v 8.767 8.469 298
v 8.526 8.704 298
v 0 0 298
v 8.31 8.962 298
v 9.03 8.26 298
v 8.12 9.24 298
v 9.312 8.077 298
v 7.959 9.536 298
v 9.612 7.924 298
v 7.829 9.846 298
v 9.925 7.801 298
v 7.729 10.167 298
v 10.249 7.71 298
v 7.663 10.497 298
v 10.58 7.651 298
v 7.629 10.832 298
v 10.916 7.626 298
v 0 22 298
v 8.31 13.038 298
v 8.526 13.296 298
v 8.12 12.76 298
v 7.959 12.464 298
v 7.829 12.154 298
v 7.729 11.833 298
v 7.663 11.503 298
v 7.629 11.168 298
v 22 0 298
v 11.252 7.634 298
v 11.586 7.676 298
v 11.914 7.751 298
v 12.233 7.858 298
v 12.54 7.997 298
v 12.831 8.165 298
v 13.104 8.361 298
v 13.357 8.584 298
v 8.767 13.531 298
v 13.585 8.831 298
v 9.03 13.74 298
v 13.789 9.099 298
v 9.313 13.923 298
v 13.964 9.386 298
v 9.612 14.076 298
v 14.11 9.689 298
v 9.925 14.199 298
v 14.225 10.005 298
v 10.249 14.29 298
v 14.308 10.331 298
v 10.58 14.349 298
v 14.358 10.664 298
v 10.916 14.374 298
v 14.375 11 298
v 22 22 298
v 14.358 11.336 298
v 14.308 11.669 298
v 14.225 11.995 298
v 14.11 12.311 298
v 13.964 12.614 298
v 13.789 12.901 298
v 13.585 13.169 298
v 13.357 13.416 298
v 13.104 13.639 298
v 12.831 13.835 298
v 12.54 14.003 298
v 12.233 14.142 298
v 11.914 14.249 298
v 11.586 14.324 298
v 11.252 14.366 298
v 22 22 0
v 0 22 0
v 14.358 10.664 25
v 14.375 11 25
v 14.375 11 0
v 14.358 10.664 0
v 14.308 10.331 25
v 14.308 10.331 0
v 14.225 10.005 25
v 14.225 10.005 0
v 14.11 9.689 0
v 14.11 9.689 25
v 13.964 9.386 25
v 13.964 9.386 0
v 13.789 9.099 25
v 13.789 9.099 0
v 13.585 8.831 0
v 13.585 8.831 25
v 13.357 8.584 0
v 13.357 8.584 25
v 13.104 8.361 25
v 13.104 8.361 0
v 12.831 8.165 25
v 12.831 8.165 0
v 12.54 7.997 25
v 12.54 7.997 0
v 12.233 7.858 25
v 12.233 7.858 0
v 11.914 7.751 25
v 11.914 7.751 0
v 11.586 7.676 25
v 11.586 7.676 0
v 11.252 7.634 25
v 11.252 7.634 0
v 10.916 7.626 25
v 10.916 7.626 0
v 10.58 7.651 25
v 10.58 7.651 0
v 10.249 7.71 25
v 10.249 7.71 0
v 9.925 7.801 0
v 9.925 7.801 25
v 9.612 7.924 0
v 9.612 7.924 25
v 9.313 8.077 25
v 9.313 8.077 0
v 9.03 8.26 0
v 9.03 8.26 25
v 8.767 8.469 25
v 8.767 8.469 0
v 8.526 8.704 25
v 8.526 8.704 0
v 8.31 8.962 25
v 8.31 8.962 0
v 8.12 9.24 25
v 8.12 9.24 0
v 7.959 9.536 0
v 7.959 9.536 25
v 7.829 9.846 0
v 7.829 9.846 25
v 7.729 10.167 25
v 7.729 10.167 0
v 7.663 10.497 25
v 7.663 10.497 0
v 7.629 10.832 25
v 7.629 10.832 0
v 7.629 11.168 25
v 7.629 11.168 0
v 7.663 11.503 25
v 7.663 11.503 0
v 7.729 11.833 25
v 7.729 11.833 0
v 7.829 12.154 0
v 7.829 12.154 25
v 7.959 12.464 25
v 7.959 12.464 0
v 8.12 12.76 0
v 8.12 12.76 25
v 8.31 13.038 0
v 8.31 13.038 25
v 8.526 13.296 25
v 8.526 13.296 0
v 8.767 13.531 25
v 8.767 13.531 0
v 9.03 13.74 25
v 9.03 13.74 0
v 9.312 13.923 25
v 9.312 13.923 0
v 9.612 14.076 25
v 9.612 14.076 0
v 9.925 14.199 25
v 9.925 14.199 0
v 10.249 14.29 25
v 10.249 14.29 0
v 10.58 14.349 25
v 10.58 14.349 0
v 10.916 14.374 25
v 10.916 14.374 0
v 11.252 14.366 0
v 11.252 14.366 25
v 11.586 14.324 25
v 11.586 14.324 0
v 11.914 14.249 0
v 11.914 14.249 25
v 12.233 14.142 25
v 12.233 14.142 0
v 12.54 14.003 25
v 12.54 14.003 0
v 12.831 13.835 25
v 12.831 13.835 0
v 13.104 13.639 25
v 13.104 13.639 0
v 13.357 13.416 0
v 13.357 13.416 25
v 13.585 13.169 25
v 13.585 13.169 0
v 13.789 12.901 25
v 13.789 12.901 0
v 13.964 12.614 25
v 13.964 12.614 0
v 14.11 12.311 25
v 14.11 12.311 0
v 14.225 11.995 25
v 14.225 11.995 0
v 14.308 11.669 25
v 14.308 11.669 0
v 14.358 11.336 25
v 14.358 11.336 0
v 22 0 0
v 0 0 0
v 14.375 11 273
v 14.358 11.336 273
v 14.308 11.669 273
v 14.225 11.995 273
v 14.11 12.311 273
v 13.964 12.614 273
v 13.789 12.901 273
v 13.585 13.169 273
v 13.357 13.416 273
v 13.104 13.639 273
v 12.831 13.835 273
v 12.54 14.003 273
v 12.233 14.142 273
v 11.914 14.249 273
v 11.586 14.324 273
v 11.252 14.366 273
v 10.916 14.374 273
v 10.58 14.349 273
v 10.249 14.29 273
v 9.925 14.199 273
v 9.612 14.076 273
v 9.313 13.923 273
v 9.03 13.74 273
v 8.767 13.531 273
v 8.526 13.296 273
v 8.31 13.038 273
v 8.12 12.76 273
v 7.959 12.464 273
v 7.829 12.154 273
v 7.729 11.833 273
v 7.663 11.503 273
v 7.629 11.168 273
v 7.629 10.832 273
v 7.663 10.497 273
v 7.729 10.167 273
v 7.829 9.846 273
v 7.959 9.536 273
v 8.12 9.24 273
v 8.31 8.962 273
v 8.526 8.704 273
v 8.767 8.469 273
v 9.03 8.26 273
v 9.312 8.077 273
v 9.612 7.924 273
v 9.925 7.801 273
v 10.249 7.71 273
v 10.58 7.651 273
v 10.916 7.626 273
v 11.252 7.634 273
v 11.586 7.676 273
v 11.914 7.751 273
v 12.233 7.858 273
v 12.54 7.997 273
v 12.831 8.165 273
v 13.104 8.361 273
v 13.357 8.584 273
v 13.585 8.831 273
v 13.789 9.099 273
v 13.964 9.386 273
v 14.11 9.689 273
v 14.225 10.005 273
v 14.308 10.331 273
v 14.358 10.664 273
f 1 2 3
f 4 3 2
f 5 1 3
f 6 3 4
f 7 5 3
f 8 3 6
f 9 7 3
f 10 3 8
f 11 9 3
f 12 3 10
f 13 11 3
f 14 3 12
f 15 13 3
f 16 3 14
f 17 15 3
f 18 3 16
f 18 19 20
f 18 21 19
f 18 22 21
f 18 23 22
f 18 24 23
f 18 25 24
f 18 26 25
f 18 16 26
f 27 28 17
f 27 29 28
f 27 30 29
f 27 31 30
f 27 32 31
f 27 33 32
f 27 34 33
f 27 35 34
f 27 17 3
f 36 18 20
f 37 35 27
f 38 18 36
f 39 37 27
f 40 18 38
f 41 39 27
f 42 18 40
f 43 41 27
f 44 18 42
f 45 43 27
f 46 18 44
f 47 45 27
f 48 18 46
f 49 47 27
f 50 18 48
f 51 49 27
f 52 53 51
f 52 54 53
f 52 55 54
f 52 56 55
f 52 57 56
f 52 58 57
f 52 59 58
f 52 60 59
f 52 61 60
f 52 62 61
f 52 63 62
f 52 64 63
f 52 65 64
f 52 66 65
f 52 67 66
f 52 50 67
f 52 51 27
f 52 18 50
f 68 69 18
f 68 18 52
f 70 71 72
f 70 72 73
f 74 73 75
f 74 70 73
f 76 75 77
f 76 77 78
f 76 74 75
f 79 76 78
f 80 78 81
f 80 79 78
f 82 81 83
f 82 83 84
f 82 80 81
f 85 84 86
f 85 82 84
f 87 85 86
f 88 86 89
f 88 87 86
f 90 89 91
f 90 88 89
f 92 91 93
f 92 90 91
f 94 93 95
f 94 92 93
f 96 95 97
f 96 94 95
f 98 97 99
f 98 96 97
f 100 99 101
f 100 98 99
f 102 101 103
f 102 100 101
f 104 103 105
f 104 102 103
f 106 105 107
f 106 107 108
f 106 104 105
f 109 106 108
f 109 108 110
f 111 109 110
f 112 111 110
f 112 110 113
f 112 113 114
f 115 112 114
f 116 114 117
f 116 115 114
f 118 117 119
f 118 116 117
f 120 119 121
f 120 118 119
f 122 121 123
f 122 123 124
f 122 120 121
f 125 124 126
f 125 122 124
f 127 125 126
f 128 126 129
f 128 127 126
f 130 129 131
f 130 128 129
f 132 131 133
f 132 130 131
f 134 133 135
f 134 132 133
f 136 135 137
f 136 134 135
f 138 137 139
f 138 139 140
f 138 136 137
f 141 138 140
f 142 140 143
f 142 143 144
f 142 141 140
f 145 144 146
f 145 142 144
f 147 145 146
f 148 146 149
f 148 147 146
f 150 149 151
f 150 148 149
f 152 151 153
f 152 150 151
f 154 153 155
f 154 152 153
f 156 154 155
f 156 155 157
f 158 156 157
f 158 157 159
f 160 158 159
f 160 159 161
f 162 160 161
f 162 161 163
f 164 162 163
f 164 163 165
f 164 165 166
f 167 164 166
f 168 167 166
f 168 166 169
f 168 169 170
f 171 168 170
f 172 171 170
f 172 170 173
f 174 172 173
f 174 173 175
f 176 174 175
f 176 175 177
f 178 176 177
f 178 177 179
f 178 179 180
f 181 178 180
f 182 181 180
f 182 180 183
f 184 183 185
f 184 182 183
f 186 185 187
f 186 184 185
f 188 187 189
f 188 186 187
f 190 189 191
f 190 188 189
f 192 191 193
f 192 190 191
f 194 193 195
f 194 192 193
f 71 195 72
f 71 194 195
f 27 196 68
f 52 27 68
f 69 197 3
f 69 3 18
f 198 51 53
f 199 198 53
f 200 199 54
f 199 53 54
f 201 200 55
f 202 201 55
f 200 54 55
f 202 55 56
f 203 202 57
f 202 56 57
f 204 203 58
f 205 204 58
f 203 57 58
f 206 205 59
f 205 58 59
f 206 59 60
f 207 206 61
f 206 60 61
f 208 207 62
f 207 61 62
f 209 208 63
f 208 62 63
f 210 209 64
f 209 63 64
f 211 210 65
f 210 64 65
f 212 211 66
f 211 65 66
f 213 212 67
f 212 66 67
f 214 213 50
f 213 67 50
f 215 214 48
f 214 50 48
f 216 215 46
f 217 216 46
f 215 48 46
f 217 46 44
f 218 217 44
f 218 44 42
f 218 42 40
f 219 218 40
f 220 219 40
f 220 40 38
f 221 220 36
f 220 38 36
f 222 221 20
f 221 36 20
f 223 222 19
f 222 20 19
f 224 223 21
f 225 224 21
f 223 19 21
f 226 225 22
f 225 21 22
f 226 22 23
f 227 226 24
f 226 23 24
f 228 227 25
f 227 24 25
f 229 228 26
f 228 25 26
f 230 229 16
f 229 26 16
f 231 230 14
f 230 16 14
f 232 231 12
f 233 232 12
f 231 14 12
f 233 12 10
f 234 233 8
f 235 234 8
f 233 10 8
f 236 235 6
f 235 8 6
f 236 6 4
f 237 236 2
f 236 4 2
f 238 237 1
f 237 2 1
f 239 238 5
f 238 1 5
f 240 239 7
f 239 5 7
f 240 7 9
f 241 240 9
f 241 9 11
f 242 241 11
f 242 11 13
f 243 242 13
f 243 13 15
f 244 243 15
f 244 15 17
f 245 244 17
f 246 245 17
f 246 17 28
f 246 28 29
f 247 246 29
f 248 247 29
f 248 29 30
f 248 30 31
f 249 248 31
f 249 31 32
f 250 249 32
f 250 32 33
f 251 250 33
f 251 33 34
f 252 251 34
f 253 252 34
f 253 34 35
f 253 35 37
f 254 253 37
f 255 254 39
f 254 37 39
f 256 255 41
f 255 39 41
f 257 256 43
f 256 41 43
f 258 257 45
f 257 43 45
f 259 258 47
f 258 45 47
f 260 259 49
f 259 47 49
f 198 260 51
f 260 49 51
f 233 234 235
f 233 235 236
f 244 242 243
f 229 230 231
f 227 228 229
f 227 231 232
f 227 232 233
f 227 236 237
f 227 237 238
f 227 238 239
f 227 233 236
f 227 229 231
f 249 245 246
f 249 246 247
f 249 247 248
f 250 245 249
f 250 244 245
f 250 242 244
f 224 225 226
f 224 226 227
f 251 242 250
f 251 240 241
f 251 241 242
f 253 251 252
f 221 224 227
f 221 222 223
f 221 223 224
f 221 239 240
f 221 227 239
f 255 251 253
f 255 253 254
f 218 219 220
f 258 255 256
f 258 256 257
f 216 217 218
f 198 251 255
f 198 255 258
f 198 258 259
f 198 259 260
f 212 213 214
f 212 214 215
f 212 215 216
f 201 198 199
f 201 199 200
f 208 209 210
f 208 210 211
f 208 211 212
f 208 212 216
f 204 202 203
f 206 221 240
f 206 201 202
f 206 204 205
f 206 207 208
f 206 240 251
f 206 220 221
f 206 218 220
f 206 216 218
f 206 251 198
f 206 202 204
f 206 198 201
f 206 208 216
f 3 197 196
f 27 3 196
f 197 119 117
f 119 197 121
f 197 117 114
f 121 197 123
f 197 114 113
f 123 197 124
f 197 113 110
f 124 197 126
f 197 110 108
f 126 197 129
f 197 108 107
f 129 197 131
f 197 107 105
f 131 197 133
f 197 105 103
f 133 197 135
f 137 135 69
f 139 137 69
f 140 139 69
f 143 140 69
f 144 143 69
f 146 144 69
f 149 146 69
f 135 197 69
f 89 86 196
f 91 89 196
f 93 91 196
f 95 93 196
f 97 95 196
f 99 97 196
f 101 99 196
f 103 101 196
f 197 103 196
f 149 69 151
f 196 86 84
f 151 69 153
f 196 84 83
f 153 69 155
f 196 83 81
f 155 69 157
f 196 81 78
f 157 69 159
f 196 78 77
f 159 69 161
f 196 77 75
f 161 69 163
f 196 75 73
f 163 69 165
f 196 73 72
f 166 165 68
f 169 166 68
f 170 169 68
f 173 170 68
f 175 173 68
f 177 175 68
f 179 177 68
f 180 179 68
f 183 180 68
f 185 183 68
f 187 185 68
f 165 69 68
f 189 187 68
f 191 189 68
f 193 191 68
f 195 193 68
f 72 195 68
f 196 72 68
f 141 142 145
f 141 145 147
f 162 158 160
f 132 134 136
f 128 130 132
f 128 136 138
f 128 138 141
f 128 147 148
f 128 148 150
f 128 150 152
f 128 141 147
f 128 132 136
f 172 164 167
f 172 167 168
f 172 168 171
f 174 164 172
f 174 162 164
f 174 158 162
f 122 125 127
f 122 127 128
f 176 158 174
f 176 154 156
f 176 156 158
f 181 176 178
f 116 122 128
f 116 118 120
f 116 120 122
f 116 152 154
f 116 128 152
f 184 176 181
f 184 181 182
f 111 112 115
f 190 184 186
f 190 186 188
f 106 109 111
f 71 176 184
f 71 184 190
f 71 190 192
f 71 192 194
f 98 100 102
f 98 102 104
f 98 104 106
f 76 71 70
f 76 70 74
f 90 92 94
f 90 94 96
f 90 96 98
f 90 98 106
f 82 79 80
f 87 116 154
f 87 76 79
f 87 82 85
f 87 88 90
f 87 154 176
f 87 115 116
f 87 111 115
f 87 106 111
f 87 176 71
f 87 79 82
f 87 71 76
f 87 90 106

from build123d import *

# Parameters (mm, degrees)
ESQUISSE1_W             = 22
ESQUISSE1_H             = 22
BASE_EXTRUSION_DEPTH    = 298
ESQUISSE2_R             = 3.375
ENL_V_MAT_EXTRU_1_DEPTH = 25
ENL_V_START             = -25
ESQUISSE3_R             = 3.375
ENL_V_MAT_EXTRU_2_DEPTH = 25


with BuildPart() as part:
    # Esquisse1 → Base-Extrusion (new body)
    with BuildSketch(Plane.XY):
        with Locations((11, 11)):
            Rectangle(ESQUISSE1_W, ESQUISSE1_H)
    extrude(amount=BASE_EXTRUSION_DEPTH)

    # Esquisse2 → Enlèv. mat.-Extru.1 (cut)
    with BuildSketch(Plane.XY.offset(298)):
        with Locations((11, 11)):
            Circle(ESQUISSE2_R)
    extrude(amount=-ENL_V_MAT_EXTRU_1_DEPTH, mode=Mode.SUBTRACT)

    # Esquisse3 → Enlèv. mat.-Extru.2 (cut)
    with BuildSketch(Plane(origin=(0, 0, 0), x_dir=(-1, 0, 0), z_dir=(0, 0, -1)).offset(ENL_V_START)):
        with Locations(Location((-11, 11, 0), (0, 0, 180))):
            Circle(ESQUISSE3_R)
    extrude(amount=ENL_V_MAT_EXTRU_2_DEPTH, mode=Mode.SUBTRACT)


solid = part.part
